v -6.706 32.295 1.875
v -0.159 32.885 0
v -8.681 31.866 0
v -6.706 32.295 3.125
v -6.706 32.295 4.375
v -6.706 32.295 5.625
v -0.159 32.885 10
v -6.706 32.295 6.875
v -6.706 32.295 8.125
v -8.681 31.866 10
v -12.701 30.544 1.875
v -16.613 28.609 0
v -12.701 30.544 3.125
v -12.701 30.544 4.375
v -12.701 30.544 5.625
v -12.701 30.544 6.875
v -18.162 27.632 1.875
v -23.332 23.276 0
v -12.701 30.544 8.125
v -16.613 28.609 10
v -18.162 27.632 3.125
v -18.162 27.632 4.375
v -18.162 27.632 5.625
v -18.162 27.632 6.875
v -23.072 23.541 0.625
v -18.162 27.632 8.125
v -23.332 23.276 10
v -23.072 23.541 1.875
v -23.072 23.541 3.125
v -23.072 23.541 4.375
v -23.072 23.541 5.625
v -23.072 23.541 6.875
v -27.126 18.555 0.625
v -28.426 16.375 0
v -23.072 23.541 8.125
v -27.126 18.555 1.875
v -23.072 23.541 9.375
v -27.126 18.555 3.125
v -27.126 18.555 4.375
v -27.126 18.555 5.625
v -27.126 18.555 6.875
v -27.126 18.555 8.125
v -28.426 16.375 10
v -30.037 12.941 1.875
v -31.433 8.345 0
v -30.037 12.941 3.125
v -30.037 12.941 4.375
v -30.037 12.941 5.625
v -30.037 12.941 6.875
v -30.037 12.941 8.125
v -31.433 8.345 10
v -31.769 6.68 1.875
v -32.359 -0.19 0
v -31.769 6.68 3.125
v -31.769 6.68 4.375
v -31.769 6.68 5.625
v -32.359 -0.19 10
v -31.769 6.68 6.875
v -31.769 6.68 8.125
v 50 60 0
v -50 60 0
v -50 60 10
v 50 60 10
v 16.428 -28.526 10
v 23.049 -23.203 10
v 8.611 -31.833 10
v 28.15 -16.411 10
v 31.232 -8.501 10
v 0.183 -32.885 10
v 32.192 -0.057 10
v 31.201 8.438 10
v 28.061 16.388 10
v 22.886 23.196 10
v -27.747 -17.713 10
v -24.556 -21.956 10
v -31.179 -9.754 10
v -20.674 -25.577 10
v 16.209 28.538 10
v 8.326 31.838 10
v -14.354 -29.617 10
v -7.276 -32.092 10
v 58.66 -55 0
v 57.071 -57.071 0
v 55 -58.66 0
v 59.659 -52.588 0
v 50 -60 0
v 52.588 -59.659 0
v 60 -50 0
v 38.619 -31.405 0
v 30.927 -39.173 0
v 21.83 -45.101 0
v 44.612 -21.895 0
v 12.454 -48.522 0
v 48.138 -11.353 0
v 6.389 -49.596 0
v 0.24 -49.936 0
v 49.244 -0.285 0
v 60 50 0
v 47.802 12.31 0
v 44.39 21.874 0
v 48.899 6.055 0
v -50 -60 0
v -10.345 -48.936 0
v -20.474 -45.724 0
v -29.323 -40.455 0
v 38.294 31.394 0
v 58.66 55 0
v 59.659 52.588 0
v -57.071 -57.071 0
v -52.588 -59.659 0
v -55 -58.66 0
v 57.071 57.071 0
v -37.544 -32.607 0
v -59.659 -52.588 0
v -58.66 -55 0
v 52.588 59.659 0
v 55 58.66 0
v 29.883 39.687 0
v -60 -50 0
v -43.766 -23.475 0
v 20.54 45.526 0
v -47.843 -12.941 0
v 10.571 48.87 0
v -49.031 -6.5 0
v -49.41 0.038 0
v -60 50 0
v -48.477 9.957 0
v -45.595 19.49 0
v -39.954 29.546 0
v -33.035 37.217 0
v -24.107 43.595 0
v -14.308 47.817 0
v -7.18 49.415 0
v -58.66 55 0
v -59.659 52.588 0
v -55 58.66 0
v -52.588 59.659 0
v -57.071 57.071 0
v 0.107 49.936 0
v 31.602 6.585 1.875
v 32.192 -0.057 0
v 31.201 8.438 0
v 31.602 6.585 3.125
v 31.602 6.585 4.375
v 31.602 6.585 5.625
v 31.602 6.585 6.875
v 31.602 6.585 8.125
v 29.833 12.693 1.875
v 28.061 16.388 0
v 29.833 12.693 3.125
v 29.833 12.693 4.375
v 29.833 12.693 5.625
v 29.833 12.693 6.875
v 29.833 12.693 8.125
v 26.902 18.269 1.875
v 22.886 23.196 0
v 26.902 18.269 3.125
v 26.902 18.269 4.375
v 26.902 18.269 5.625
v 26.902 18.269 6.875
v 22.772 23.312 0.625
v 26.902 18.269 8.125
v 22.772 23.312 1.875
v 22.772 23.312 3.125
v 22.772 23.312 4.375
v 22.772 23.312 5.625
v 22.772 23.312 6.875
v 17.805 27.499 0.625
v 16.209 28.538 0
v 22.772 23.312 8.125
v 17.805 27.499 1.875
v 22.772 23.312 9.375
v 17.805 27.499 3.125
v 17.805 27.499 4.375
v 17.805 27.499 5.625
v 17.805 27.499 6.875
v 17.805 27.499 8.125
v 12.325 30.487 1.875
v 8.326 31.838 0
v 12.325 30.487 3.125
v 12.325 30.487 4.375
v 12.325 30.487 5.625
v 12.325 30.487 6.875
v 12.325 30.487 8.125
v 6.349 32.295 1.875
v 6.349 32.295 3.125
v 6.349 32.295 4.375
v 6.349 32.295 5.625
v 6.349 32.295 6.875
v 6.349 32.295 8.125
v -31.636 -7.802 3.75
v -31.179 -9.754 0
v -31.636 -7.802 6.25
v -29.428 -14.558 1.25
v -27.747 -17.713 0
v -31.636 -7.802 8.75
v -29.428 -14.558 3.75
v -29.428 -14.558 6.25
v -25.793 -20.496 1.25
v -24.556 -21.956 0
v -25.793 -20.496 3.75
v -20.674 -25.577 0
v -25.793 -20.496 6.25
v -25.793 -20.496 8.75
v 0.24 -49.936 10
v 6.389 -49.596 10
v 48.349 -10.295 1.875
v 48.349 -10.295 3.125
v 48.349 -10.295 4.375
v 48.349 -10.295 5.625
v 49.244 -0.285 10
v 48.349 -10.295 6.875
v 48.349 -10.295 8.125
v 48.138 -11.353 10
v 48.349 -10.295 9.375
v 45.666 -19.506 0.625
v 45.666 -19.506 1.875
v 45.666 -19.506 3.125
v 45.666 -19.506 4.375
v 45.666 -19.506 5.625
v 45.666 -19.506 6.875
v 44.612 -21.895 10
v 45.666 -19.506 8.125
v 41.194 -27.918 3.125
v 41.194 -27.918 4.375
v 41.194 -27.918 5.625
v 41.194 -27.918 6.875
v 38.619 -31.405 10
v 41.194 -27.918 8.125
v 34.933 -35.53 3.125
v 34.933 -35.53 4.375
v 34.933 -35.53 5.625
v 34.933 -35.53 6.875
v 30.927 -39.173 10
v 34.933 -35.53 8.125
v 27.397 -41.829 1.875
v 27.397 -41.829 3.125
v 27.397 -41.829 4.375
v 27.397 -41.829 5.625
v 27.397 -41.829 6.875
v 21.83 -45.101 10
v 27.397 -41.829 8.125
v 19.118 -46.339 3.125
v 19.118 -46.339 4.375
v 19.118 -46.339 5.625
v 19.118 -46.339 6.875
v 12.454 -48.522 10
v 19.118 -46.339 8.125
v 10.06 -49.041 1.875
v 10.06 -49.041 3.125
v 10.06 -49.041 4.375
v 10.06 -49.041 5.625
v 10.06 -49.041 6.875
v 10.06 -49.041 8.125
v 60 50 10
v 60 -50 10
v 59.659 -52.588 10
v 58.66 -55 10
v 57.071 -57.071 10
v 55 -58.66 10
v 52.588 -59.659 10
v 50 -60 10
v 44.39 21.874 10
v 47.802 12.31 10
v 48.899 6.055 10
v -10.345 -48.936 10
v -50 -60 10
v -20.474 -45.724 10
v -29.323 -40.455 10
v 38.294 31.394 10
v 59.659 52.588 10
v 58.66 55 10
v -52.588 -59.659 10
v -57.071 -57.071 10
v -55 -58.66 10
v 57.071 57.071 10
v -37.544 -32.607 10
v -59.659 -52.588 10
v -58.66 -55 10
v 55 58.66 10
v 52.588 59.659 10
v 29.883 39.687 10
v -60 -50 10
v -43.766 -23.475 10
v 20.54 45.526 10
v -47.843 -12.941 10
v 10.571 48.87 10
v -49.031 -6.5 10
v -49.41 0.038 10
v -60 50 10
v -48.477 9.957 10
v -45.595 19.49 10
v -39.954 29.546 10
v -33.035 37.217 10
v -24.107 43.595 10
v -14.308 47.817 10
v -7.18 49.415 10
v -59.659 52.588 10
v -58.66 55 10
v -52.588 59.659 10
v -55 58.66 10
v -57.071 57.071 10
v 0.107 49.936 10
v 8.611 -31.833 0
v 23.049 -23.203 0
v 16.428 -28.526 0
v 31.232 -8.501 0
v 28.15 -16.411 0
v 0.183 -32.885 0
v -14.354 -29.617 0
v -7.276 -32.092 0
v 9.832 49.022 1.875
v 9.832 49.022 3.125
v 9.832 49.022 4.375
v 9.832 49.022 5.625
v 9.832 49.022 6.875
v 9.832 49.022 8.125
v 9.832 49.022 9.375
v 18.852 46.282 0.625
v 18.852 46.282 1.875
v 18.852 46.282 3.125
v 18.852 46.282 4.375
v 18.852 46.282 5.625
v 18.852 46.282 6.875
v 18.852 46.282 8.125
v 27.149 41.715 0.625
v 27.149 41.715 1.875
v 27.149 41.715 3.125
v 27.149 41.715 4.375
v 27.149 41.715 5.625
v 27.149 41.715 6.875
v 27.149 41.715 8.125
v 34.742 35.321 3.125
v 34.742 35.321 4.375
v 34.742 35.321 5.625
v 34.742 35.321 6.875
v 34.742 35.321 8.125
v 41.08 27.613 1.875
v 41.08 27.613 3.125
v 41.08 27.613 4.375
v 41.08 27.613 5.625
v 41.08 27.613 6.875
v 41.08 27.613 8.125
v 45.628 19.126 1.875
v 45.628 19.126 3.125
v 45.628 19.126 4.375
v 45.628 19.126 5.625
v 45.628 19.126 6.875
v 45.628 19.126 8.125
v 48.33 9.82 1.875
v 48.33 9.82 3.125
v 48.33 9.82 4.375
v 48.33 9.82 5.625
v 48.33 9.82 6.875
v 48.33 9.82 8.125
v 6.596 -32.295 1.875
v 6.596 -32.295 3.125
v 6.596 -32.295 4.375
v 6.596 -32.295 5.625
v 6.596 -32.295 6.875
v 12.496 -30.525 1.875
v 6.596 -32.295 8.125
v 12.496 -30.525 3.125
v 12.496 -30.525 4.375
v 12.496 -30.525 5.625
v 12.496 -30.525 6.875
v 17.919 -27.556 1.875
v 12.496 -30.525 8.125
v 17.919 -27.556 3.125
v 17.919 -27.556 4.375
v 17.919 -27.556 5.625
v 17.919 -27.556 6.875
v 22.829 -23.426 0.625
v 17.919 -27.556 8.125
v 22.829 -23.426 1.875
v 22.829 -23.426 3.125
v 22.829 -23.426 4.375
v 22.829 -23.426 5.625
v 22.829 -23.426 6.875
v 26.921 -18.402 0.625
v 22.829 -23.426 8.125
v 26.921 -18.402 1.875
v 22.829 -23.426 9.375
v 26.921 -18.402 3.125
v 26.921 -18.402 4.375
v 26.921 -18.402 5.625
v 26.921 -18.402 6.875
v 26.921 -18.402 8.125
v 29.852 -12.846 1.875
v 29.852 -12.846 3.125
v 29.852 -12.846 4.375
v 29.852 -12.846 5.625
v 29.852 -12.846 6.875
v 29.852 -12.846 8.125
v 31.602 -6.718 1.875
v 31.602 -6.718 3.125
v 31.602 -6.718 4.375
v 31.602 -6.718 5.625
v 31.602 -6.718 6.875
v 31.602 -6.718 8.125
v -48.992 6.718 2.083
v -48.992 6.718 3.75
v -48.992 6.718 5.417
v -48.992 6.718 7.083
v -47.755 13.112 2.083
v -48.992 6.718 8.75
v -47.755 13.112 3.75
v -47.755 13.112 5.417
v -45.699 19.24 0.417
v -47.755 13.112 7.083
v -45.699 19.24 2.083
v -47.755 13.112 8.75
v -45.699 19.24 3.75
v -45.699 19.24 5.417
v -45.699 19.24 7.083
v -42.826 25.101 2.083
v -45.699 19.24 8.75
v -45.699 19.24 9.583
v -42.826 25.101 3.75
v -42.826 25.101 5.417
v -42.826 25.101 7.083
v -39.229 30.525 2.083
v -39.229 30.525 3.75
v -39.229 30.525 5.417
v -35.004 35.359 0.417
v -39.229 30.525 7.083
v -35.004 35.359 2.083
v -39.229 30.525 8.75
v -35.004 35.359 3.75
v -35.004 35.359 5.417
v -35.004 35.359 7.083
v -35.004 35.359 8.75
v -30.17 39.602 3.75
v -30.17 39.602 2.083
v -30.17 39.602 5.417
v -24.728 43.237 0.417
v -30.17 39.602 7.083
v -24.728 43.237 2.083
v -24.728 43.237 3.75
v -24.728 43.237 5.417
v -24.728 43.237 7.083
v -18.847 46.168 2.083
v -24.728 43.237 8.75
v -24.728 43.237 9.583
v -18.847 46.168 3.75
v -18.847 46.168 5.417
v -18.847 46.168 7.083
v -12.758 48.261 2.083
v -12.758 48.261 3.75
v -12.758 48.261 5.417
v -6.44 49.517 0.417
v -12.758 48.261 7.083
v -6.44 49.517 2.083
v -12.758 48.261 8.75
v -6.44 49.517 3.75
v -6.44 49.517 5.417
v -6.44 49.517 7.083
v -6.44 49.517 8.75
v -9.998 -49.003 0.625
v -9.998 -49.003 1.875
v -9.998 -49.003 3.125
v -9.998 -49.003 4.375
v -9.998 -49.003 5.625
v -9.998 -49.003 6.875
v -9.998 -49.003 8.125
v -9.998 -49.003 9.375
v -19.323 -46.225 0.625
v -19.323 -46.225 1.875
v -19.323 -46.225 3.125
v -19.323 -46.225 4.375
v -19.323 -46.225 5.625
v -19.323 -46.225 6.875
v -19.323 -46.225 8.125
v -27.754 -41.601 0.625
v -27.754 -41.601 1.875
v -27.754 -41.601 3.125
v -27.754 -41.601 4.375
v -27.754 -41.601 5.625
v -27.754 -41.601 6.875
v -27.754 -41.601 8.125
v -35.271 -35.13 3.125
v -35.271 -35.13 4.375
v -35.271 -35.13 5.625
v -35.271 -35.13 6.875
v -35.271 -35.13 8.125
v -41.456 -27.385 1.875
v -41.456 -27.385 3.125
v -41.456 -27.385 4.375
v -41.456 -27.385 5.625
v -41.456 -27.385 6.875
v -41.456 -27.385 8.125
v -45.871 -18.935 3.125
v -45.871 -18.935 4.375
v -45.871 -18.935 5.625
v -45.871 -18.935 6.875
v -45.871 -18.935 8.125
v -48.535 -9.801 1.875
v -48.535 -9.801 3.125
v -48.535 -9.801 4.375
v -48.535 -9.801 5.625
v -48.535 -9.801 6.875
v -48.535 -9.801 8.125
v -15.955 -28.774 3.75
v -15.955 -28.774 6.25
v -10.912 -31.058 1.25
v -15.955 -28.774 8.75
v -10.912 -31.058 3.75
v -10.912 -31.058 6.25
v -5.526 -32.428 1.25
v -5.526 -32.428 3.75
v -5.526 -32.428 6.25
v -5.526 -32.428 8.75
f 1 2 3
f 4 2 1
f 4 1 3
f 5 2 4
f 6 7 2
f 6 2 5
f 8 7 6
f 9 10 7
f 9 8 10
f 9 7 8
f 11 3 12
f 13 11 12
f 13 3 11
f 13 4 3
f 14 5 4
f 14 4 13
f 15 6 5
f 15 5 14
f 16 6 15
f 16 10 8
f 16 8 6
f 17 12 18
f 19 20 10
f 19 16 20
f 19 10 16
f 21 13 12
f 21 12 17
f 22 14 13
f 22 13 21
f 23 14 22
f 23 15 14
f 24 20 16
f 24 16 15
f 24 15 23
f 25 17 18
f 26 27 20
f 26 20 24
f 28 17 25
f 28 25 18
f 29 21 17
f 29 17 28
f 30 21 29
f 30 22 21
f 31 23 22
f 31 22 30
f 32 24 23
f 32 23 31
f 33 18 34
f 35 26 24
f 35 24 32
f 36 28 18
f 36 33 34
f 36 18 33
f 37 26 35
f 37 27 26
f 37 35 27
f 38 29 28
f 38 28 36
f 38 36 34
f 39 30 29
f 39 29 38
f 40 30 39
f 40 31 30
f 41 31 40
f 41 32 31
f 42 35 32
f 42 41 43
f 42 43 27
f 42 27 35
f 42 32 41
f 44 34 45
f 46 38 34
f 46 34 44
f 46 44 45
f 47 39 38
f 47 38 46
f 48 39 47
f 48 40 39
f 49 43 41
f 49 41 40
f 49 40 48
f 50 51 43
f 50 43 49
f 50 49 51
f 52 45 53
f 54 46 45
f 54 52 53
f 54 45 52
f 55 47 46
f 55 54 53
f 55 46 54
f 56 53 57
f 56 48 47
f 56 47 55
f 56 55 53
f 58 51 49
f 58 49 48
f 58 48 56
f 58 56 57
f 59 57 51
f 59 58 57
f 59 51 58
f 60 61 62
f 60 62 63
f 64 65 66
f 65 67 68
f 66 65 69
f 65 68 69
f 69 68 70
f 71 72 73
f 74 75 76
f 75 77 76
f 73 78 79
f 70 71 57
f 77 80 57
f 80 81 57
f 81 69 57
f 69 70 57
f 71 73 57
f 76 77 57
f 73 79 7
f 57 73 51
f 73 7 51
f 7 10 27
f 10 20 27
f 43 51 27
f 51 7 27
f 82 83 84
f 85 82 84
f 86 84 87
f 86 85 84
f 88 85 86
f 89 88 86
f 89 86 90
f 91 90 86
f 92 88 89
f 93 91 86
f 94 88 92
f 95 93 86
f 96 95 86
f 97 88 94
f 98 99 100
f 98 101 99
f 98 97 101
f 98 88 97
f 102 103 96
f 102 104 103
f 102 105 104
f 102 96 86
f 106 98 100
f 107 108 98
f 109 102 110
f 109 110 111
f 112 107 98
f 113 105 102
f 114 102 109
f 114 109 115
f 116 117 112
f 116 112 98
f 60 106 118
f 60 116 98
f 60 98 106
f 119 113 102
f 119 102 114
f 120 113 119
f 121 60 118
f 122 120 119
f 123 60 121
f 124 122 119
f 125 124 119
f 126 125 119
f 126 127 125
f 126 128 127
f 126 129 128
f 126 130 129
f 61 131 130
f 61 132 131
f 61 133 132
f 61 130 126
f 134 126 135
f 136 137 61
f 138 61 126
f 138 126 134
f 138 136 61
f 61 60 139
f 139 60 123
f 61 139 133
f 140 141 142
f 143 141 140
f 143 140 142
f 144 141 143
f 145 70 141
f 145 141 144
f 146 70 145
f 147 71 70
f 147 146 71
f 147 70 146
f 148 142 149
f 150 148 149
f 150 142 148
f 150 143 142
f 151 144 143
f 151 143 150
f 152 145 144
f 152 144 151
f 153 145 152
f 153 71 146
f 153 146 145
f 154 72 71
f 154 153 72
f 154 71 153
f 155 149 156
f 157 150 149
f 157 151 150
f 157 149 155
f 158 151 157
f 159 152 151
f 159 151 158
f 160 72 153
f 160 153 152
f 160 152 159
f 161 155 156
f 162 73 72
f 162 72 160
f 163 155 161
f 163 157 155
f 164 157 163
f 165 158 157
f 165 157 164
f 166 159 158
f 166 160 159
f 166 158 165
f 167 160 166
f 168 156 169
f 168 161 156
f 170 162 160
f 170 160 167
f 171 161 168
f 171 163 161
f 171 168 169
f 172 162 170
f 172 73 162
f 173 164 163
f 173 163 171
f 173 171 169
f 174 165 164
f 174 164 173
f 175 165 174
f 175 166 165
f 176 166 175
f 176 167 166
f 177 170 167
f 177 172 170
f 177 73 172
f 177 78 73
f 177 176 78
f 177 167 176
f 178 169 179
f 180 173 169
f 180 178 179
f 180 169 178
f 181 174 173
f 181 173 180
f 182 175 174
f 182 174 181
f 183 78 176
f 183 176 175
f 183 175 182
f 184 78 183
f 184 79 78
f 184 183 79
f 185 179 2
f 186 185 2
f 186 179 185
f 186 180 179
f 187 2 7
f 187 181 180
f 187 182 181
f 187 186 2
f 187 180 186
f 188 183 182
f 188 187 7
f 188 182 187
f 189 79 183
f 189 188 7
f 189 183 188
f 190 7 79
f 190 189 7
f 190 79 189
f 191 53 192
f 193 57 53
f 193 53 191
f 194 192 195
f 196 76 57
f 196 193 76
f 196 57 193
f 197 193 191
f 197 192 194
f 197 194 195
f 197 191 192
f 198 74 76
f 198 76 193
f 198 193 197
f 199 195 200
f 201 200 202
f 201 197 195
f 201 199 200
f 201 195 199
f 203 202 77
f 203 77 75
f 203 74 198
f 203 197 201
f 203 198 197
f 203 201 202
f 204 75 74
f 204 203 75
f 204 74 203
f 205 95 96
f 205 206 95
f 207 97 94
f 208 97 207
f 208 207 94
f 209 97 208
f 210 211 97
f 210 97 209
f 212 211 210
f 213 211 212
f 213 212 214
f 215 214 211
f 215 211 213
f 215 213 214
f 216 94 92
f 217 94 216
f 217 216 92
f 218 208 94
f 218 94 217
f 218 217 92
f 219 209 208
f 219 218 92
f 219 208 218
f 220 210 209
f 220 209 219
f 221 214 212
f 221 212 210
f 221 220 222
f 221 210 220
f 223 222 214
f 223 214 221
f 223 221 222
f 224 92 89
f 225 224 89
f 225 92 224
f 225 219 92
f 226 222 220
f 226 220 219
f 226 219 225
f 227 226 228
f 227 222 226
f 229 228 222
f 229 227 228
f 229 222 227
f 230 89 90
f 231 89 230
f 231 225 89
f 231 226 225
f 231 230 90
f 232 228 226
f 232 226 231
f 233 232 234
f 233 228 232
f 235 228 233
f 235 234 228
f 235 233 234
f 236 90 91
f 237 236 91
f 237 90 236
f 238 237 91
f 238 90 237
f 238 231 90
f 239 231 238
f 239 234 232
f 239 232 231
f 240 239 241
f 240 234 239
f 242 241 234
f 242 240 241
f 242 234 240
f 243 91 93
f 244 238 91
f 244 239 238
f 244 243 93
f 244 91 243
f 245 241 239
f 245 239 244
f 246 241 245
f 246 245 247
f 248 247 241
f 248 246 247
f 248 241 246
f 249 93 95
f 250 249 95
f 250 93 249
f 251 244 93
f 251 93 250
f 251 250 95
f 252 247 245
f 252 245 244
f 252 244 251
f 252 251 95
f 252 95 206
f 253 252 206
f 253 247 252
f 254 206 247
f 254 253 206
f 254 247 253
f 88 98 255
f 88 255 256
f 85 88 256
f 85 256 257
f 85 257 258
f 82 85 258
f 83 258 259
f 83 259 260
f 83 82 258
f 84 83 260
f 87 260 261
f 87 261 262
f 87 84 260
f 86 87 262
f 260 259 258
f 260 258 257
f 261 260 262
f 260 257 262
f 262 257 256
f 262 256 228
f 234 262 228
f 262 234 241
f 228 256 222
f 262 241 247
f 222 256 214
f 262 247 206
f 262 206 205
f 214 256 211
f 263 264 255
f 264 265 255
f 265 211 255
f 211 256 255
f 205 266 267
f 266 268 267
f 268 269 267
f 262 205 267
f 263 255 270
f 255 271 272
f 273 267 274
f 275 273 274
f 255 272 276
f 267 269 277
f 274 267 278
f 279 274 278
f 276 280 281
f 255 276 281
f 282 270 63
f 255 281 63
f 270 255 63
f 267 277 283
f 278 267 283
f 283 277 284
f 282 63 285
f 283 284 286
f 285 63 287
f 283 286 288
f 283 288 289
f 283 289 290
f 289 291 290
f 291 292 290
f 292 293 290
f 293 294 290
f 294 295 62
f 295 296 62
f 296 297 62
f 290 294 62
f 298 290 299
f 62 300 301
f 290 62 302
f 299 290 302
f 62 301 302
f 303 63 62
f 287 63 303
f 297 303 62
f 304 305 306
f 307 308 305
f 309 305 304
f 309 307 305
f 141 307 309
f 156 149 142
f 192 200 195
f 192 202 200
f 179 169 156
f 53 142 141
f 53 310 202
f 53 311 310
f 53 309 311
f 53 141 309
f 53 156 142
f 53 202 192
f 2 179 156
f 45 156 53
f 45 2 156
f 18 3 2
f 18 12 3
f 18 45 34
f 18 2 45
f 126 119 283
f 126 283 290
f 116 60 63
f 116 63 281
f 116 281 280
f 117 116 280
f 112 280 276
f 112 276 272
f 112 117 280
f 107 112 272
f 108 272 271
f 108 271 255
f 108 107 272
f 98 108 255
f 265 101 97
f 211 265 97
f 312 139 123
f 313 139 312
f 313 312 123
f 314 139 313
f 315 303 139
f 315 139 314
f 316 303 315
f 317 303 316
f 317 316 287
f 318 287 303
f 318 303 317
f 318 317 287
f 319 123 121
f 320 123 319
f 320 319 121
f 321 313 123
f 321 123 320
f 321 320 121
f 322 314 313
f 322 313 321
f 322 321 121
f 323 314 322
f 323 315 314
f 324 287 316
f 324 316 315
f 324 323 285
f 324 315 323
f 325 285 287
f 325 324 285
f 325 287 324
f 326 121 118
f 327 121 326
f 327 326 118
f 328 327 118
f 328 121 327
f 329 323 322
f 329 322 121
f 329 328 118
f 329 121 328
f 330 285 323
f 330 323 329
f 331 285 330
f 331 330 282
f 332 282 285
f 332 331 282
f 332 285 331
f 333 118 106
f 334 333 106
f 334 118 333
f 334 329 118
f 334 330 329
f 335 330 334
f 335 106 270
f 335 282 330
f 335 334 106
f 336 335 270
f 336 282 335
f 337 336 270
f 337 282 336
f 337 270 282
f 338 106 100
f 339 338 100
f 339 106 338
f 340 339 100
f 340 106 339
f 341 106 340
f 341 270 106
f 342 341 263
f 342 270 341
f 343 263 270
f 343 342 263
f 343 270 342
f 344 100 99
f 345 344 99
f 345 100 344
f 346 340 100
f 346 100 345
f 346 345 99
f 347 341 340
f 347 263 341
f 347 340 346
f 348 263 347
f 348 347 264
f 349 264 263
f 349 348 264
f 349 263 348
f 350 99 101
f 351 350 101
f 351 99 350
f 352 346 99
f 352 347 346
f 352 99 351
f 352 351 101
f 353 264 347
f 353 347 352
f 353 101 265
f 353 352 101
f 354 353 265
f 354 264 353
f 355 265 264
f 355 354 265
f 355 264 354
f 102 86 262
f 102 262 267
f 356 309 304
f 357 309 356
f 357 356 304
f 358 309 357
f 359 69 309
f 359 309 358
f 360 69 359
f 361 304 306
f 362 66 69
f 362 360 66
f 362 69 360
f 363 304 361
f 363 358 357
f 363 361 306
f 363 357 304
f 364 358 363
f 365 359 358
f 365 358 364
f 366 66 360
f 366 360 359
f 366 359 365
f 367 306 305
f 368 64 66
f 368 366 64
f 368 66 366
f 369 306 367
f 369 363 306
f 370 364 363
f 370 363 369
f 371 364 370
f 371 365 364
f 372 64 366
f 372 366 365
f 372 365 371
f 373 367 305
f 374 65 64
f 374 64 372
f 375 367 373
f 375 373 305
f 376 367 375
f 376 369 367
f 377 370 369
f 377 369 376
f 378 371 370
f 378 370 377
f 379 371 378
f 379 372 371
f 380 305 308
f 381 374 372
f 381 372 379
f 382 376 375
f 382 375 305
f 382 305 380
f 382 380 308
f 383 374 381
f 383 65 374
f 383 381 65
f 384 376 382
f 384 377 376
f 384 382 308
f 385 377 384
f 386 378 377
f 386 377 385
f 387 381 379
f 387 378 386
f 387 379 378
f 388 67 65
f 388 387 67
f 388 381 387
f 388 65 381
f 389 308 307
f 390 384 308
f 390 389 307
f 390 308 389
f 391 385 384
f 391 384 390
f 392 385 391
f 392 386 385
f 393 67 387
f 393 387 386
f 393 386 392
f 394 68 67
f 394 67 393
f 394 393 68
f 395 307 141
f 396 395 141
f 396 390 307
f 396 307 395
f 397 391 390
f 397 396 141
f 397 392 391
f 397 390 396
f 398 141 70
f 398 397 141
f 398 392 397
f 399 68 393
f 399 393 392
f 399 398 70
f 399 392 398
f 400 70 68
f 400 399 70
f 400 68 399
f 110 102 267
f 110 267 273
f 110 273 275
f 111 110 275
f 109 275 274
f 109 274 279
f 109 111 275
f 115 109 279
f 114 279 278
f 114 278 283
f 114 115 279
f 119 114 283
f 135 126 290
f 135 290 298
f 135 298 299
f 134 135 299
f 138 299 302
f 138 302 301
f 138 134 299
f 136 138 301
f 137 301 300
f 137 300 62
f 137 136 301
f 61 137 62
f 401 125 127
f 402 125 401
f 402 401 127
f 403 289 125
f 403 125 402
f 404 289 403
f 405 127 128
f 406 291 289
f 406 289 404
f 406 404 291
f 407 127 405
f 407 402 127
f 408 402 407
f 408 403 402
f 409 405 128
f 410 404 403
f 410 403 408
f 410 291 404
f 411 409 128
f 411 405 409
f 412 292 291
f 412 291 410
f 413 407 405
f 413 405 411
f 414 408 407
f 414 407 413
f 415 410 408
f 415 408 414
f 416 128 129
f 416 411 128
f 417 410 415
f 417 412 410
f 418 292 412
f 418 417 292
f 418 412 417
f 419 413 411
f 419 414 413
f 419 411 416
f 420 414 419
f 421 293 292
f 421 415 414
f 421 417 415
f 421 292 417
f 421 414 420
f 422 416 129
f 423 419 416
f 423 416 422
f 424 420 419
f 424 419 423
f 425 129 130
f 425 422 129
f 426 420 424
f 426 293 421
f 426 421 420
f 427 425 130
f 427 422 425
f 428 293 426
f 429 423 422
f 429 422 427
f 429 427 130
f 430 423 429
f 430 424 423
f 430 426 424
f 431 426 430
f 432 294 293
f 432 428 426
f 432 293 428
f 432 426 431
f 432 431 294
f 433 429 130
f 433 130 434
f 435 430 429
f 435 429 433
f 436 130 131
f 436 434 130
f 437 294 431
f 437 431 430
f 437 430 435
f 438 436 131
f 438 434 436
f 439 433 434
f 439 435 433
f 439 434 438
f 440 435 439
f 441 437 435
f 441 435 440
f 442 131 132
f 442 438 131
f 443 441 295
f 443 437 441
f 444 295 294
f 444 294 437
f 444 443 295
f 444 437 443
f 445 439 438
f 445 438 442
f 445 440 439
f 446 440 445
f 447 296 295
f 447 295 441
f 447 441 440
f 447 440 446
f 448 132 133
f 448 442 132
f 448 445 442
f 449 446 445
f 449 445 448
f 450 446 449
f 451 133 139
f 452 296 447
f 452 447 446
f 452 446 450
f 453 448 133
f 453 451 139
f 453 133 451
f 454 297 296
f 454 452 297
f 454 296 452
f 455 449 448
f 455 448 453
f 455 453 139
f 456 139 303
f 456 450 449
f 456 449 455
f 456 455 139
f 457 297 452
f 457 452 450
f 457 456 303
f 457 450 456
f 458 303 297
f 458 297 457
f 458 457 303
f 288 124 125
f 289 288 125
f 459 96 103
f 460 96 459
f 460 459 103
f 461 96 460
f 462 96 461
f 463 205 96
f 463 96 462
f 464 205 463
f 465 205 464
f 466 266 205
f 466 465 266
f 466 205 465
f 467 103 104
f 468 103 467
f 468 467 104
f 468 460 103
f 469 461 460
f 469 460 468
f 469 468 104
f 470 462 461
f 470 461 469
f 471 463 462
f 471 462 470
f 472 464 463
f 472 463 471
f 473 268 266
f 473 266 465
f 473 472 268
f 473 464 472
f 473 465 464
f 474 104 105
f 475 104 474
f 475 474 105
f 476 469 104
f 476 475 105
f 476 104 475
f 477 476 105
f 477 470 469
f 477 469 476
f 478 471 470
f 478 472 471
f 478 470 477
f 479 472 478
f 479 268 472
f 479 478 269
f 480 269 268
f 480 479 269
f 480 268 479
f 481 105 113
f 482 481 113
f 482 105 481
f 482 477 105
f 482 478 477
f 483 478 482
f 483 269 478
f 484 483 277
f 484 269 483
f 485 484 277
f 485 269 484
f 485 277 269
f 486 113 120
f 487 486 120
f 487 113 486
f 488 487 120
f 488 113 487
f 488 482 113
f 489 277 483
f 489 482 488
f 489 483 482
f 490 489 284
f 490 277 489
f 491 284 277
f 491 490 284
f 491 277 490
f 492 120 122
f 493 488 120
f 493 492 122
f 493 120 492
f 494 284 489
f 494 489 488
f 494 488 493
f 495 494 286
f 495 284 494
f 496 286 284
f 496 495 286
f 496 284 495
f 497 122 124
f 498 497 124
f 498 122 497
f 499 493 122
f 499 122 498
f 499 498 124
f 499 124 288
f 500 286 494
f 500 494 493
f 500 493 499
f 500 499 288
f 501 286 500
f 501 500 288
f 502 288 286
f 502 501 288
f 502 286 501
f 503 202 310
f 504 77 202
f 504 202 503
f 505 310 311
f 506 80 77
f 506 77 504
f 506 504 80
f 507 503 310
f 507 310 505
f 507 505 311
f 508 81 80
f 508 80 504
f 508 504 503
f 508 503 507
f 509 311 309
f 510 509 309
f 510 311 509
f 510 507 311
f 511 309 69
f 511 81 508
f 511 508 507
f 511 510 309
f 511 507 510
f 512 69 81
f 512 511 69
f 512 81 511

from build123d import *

# Parameters (mm, degrees)
BOSS_EXTRUDE1_DEPTH = 10
CUT_EXTRUDE28_DEPTH = 10


with BuildPart() as part:
    # Sketch1 → Boss-Extrude1 (new body)
    with BuildSketch(Plane.XY):
        with BuildLine():
            Line((-50, 60), (50, 60))
            ThreePointArc((50, 60), (57.071067812, 57.071067812), (60, 50))
            Line((60, 50), (60, -50))
            ThreePointArc((60, -50), (57.071067812, -57.071067812), (50, -60))
            Line((50, -60), (-50, -60))
            ThreePointArc((-50, -60), (-57.071067812, -57.071067812), (-60, -50))
            Line((-60, -50), (-60, 50))
            ThreePointArc((-60, 50), (-57.071067812, 57.071067812), (-50, 60))
        make_face()
    extrude(amount=BOSS_EXTRUDE1_DEPTH)

    # Sketch2 → Cut-Extrude28 (cut)
    with BuildSketch(Plane.XY.offset(10)):
        with BuildLine():
            add(Edge.make_bspline(
                [(0.106971154, 49.935897436), (1.758662582, 49.893132187), (5.019475563, 49.808703899), (9.814954752, 49.10492823), (14.436285632, 47.958226673), (18.881378449, 46.364228567), (23.139103204, 44.279760346), (27.224478315, 41.763918049), (31.122870164, 38.769216661), (34.794331157, 35.365517625), (38.187423276, 31.664143545), (41.127539579, 27.678956295), (43.6347629, 23.513216081), (45.712756297, 19.155760679), (47.295535048, 14.576412634), (48.406236364, 9.798520568), (49.119806932, 4.823443746), (49.201878527, 1.436094542), (49.243589744, -0.285456731)],
                knots=[0, 0, 0, 0, 1.014329547, 2.002516266, 2.970391464, 3.935626869, 4.897733899, 5.877609409, 6.878433252, 7.912639331, 8.949961323, 9.958554974, 10.949718813, 11.932905612, 12.9188844, 13.919928257, 14.942845884, 16, 16, 16, 16], degree=3))
            add(Edge.make_bspline(
                [(49.243589744, -0.285456731), (49.199169102, -1.987610097), (49.111636803, -5.341757915), (48.435367439, -10.270987444), (47.305961773, -14.997698332), (45.750028191, -19.532589595), (43.709721738, -23.853695777), (41.251392002, -27.988606538), (38.310168333, -31.898948917), (34.99332871, -35.582624476), (31.341776131, -38.926350477), (27.474202274, -41.87300324), (23.408465206, -44.369885593), (19.150515867, -46.415853842), (14.691223289, -48.003654451), (10.041602472, -49.123963157), (5.20194113, -49.804797378), (1.91073672, -49.891757925), (0.240184295, -49.935897436)],
                knots=[0, 0, 0, 0, 1.051557043, 2.072126891, 3.067553643, 4.050577992, 5.02905126, 6.015227836, 7.017913613, 8.04756643, 9.074058332, 10.072836633, 11.047628519, 12.017157415, 12.98668631, 13.966869689, 14.968021931, 16, 16, 16, 16], degree=3))
            add(Edge.make_bspline(
                [(0.240184295, -49.935897436), (-1.507013234, -49.896302119), (-4.940017558, -49.818502734), (-9.964234753, -49.078666096), (-14.777868956, -47.964213673), (-19.340482865, -46.300953219), (-23.698542806, -44.221737793), (-27.82002883, -41.661059338), (-31.703555849, -38.623149574), (-35.326847315, -35.185810498), (-38.609558159, -31.424607627), (-41.507194384, -27.451230333), (-43.951414819, -23.296031725), (-45.942308892, -18.957067081), (-47.511849804, -14.461302012), (-48.618982586, -9.78135601), (-49.27299234, -4.928453285), (-49.364092101, -1.632264744), (-49.41025641, 0.038060897)],
                knots=[0, 0, 0, 0, 1.067978421, 2.098431617, 3.099715153, 4.085208694, 5.062210972, 6.048429807, 7.046490867, 8.072918869, 9.098532598, 10.095778865, 11.076610158, 12.041847152, 13.011192615, 13.984257998, 14.978533688, 16, 16, 16, 16], degree=3))
            add(Edge.make_bspline(
                [(-49.41025641, 0.038060897), (-49.395767391, 1.161768547), (-49.366972815, 3.39495513), (-49.020111826, 6.704423652), (-48.520731728, 9.949295792), (-47.782172257, 13.116634197), (-46.885011267, 16.228782967), (-45.722612472, 19.256773451), (-44.399488071, 22.232952914), (-42.853541785, 25.122168949), (-41.134598995, 27.897838356), (-39.25907937, 30.546867816), (-37.222266939, 33.037226692), (-35.030722951, 35.385280596), (-32.676895049, 37.575595599), (-30.191745408, 39.639178659), (-27.527076593, 41.521213673), (-24.741209846, 43.26766369), (-21.849851243, 44.846948152), (-18.864771235, 46.191187855), (-15.847468368, 47.365089491), (-12.757635544, 48.291584568), (-9.628385819, 49.046205114), (-6.426289498, 49.545248631), (-3.180275702, 49.892100015), (-0.991378229, 49.921263649), (0.106971154, 49.935897436)],
                knots=[0, 0, 0, 0, 1.034744296, 2.056386356, 3.06226378, 4.057406941, 5.050368692, 6.043467995, 7.042652155, 8.049140477, 9.059438543, 10.048523776, 11.036952808, 12.020949711, 13.004946614, 13.997082645, 14.994316842, 16.007702937, 17.024872941, 18.026463647, 19.021641123, 20.005082605, 20.995858141, 21.984425357, 22.988620895, 24, 24, 24, 24], degree=3))
        make_face()
        with BuildLine():
            add(Edge.make_bspline(
                [(-0.159455128, 32.884615385), (-1.271043241, 32.85478898), (-3.464873358, 32.795923592), (-6.682822609, 32.347448955), (-9.772167532, 31.631183982), (-12.715782666, 30.593682922), (-15.526425897, 29.273207392), (-18.209079622, 27.674371293), (-20.726594635, 25.742216423), (-23.112539564, 23.580471561), (-25.267848195, 21.171790985), (-27.172131364, 18.590480109), (-28.765709657, 15.84084968), (-30.100341461, 12.948443113), (-31.105023413, 9.880736062), (-31.820628245, 6.661758209), (-32.272863787, 3.285963096), (-32.329868639, 0.984687962), (-32.358974359, -0.190304487)],
                knots=[0, 0, 0, 0, 1.033739768, 2.040188636, 3.016340934, 3.979330865, 4.937572243, 5.900995986, 6.878200029, 7.884839167, 8.891893314, 9.879764717, 10.863503415, 11.843163062, 12.837761627, 13.859916423, 14.907309254, 16, 16, 16, 16], degree=3))
            add(Edge.make_bspline(
                [(-32.358974359, -0.190304487), (-32.320384617, -1.492460432), (-32.244755118, -4.044470326), (-31.712616761, -7.767273602), (-30.802181003, -11.283091808), (-29.48752947, -14.574729602), (-27.857016666, -17.678738159), (-25.832178542, -20.55707344), (-23.44580789, -23.226969572), (-21.607367274, -24.785766143), (-20.674278846, -25.576923077)],
                knots=[0, 0, 0, 0, 1.078454662, 2.113592447, 3.107694534, 4.079536787, 5.043276885, 6.005368276, 6.987637804, 8, 8, 8, 8], degree=3))
            add(Edge.make_bspline(
                [(-20.674278846, -25.576923077), (-19.909901286, -26.161399433), (-18.398367723, -27.317183795), (-15.985631068, -28.798558557), (-13.500987404, -30.068244504), (-10.925686979, -31.09413573), (-8.265168694, -31.901084523), (-5.519797389, -32.466177495), (-2.693463022, -32.820822204), (-0.782163267, -32.863208965), (0.183092949, -32.884615385)],
                knots=[0, 0, 0, 0, 1.023928204, 2.024787132, 3.009472467, 3.9914905, 4.972207045, 5.96565515, 6.972602802, 8, 8, 8, 8], degree=3))
            add(Edge.make_bspline(
                [(0.183092949, -32.884615385), (1.275567277, -32.854536085), (3.425044876, -32.795354117), (6.583090263, -32.352400448), (9.608593662, -31.602762911), (12.520337653, -30.574363178), (15.309926069, -29.237307936), (17.963725429, -27.588880956), (20.486388567, -25.649322801), (22.869293834, -23.459189495), (25.04738189, -21.041020383), (26.947691214, -18.445941061), (28.591937334, -15.731128895), (29.898815449, -12.858159834), (30.943190115, -9.854153361), (31.65018227, -6.70580538), (32.106238176, -3.426094574), (32.163259089, -1.19413547), (32.192307692, -0.057091346)],
                knots=[0, 0, 0, 0, 1.026359118, 2.019393844, 2.989460624, 3.950973911, 4.916101784, 5.890408035, 6.881132271, 7.902007068, 8.92769091, 9.933912415, 10.920395702, 11.90457117, 12.894218921, 13.903490204, 14.931958862, 16, 16, 16, 16], degree=3))
            add(Edge.make_bspline(
                [(32.192307692, -0.057091346), (32.162254004, 1.07341446), (32.103097901, 3.298642726), (31.659364607, 6.569921417), (30.914481078, 9.704370365), (29.882993168, 12.707108457), (28.565837729, 15.58107949), (26.937041406, 18.316176884), (25.002319445, 20.909756467), (22.806199351, 23.344143987), (20.415857605, 25.581190182), (17.8495869, 27.522539625), (15.179194371, 29.209510567), (12.343408185, 30.531015484), (9.400246153, 31.583855648), (6.331748943, 32.359182252), (3.126294435, 32.792773036), (0.945557456, 32.853728383), (-0.159455128, 32.884615385)],
                knots=[0, 0, 0, 0, 1.055025985, 2.07665775, 3.074803781, 4.057872707, 5.035505728, 6.020516407, 7.023567878, 8.050795229, 9.077271434, 10.074415901, 11.050397877, 12.019801805, 12.988065821, 13.964604439, 14.968634123, 16, 16, 16, 16], degree=3))
        make_face(mode=Mode.SUBTRACT)
    extrude(amount=-CUT_EXTRUDE28_DEPTH, mode=Mode.SUBTRACT)


with BuildPart() as cut_extrude28_piece_1:
    # of the separate pieces the step leaves, piece 1, a body of its own (cut_extrude28_pieces)
    add(part.part.solids().sort_by_distance((-50, 60, 0))[0])


with BuildPart() as cut_extrude28_piece_2:
    # of the separate pieces the step leaves, piece 2, a body of its own (cut_extrude28_pieces)
    add(part.part.solids().sort_by_distance((-0.159455128, 32.884615385, 0))[0])


solid = Compound([cut_extrude28_piece_1.part, cut_extrude28_piece_2.part])
